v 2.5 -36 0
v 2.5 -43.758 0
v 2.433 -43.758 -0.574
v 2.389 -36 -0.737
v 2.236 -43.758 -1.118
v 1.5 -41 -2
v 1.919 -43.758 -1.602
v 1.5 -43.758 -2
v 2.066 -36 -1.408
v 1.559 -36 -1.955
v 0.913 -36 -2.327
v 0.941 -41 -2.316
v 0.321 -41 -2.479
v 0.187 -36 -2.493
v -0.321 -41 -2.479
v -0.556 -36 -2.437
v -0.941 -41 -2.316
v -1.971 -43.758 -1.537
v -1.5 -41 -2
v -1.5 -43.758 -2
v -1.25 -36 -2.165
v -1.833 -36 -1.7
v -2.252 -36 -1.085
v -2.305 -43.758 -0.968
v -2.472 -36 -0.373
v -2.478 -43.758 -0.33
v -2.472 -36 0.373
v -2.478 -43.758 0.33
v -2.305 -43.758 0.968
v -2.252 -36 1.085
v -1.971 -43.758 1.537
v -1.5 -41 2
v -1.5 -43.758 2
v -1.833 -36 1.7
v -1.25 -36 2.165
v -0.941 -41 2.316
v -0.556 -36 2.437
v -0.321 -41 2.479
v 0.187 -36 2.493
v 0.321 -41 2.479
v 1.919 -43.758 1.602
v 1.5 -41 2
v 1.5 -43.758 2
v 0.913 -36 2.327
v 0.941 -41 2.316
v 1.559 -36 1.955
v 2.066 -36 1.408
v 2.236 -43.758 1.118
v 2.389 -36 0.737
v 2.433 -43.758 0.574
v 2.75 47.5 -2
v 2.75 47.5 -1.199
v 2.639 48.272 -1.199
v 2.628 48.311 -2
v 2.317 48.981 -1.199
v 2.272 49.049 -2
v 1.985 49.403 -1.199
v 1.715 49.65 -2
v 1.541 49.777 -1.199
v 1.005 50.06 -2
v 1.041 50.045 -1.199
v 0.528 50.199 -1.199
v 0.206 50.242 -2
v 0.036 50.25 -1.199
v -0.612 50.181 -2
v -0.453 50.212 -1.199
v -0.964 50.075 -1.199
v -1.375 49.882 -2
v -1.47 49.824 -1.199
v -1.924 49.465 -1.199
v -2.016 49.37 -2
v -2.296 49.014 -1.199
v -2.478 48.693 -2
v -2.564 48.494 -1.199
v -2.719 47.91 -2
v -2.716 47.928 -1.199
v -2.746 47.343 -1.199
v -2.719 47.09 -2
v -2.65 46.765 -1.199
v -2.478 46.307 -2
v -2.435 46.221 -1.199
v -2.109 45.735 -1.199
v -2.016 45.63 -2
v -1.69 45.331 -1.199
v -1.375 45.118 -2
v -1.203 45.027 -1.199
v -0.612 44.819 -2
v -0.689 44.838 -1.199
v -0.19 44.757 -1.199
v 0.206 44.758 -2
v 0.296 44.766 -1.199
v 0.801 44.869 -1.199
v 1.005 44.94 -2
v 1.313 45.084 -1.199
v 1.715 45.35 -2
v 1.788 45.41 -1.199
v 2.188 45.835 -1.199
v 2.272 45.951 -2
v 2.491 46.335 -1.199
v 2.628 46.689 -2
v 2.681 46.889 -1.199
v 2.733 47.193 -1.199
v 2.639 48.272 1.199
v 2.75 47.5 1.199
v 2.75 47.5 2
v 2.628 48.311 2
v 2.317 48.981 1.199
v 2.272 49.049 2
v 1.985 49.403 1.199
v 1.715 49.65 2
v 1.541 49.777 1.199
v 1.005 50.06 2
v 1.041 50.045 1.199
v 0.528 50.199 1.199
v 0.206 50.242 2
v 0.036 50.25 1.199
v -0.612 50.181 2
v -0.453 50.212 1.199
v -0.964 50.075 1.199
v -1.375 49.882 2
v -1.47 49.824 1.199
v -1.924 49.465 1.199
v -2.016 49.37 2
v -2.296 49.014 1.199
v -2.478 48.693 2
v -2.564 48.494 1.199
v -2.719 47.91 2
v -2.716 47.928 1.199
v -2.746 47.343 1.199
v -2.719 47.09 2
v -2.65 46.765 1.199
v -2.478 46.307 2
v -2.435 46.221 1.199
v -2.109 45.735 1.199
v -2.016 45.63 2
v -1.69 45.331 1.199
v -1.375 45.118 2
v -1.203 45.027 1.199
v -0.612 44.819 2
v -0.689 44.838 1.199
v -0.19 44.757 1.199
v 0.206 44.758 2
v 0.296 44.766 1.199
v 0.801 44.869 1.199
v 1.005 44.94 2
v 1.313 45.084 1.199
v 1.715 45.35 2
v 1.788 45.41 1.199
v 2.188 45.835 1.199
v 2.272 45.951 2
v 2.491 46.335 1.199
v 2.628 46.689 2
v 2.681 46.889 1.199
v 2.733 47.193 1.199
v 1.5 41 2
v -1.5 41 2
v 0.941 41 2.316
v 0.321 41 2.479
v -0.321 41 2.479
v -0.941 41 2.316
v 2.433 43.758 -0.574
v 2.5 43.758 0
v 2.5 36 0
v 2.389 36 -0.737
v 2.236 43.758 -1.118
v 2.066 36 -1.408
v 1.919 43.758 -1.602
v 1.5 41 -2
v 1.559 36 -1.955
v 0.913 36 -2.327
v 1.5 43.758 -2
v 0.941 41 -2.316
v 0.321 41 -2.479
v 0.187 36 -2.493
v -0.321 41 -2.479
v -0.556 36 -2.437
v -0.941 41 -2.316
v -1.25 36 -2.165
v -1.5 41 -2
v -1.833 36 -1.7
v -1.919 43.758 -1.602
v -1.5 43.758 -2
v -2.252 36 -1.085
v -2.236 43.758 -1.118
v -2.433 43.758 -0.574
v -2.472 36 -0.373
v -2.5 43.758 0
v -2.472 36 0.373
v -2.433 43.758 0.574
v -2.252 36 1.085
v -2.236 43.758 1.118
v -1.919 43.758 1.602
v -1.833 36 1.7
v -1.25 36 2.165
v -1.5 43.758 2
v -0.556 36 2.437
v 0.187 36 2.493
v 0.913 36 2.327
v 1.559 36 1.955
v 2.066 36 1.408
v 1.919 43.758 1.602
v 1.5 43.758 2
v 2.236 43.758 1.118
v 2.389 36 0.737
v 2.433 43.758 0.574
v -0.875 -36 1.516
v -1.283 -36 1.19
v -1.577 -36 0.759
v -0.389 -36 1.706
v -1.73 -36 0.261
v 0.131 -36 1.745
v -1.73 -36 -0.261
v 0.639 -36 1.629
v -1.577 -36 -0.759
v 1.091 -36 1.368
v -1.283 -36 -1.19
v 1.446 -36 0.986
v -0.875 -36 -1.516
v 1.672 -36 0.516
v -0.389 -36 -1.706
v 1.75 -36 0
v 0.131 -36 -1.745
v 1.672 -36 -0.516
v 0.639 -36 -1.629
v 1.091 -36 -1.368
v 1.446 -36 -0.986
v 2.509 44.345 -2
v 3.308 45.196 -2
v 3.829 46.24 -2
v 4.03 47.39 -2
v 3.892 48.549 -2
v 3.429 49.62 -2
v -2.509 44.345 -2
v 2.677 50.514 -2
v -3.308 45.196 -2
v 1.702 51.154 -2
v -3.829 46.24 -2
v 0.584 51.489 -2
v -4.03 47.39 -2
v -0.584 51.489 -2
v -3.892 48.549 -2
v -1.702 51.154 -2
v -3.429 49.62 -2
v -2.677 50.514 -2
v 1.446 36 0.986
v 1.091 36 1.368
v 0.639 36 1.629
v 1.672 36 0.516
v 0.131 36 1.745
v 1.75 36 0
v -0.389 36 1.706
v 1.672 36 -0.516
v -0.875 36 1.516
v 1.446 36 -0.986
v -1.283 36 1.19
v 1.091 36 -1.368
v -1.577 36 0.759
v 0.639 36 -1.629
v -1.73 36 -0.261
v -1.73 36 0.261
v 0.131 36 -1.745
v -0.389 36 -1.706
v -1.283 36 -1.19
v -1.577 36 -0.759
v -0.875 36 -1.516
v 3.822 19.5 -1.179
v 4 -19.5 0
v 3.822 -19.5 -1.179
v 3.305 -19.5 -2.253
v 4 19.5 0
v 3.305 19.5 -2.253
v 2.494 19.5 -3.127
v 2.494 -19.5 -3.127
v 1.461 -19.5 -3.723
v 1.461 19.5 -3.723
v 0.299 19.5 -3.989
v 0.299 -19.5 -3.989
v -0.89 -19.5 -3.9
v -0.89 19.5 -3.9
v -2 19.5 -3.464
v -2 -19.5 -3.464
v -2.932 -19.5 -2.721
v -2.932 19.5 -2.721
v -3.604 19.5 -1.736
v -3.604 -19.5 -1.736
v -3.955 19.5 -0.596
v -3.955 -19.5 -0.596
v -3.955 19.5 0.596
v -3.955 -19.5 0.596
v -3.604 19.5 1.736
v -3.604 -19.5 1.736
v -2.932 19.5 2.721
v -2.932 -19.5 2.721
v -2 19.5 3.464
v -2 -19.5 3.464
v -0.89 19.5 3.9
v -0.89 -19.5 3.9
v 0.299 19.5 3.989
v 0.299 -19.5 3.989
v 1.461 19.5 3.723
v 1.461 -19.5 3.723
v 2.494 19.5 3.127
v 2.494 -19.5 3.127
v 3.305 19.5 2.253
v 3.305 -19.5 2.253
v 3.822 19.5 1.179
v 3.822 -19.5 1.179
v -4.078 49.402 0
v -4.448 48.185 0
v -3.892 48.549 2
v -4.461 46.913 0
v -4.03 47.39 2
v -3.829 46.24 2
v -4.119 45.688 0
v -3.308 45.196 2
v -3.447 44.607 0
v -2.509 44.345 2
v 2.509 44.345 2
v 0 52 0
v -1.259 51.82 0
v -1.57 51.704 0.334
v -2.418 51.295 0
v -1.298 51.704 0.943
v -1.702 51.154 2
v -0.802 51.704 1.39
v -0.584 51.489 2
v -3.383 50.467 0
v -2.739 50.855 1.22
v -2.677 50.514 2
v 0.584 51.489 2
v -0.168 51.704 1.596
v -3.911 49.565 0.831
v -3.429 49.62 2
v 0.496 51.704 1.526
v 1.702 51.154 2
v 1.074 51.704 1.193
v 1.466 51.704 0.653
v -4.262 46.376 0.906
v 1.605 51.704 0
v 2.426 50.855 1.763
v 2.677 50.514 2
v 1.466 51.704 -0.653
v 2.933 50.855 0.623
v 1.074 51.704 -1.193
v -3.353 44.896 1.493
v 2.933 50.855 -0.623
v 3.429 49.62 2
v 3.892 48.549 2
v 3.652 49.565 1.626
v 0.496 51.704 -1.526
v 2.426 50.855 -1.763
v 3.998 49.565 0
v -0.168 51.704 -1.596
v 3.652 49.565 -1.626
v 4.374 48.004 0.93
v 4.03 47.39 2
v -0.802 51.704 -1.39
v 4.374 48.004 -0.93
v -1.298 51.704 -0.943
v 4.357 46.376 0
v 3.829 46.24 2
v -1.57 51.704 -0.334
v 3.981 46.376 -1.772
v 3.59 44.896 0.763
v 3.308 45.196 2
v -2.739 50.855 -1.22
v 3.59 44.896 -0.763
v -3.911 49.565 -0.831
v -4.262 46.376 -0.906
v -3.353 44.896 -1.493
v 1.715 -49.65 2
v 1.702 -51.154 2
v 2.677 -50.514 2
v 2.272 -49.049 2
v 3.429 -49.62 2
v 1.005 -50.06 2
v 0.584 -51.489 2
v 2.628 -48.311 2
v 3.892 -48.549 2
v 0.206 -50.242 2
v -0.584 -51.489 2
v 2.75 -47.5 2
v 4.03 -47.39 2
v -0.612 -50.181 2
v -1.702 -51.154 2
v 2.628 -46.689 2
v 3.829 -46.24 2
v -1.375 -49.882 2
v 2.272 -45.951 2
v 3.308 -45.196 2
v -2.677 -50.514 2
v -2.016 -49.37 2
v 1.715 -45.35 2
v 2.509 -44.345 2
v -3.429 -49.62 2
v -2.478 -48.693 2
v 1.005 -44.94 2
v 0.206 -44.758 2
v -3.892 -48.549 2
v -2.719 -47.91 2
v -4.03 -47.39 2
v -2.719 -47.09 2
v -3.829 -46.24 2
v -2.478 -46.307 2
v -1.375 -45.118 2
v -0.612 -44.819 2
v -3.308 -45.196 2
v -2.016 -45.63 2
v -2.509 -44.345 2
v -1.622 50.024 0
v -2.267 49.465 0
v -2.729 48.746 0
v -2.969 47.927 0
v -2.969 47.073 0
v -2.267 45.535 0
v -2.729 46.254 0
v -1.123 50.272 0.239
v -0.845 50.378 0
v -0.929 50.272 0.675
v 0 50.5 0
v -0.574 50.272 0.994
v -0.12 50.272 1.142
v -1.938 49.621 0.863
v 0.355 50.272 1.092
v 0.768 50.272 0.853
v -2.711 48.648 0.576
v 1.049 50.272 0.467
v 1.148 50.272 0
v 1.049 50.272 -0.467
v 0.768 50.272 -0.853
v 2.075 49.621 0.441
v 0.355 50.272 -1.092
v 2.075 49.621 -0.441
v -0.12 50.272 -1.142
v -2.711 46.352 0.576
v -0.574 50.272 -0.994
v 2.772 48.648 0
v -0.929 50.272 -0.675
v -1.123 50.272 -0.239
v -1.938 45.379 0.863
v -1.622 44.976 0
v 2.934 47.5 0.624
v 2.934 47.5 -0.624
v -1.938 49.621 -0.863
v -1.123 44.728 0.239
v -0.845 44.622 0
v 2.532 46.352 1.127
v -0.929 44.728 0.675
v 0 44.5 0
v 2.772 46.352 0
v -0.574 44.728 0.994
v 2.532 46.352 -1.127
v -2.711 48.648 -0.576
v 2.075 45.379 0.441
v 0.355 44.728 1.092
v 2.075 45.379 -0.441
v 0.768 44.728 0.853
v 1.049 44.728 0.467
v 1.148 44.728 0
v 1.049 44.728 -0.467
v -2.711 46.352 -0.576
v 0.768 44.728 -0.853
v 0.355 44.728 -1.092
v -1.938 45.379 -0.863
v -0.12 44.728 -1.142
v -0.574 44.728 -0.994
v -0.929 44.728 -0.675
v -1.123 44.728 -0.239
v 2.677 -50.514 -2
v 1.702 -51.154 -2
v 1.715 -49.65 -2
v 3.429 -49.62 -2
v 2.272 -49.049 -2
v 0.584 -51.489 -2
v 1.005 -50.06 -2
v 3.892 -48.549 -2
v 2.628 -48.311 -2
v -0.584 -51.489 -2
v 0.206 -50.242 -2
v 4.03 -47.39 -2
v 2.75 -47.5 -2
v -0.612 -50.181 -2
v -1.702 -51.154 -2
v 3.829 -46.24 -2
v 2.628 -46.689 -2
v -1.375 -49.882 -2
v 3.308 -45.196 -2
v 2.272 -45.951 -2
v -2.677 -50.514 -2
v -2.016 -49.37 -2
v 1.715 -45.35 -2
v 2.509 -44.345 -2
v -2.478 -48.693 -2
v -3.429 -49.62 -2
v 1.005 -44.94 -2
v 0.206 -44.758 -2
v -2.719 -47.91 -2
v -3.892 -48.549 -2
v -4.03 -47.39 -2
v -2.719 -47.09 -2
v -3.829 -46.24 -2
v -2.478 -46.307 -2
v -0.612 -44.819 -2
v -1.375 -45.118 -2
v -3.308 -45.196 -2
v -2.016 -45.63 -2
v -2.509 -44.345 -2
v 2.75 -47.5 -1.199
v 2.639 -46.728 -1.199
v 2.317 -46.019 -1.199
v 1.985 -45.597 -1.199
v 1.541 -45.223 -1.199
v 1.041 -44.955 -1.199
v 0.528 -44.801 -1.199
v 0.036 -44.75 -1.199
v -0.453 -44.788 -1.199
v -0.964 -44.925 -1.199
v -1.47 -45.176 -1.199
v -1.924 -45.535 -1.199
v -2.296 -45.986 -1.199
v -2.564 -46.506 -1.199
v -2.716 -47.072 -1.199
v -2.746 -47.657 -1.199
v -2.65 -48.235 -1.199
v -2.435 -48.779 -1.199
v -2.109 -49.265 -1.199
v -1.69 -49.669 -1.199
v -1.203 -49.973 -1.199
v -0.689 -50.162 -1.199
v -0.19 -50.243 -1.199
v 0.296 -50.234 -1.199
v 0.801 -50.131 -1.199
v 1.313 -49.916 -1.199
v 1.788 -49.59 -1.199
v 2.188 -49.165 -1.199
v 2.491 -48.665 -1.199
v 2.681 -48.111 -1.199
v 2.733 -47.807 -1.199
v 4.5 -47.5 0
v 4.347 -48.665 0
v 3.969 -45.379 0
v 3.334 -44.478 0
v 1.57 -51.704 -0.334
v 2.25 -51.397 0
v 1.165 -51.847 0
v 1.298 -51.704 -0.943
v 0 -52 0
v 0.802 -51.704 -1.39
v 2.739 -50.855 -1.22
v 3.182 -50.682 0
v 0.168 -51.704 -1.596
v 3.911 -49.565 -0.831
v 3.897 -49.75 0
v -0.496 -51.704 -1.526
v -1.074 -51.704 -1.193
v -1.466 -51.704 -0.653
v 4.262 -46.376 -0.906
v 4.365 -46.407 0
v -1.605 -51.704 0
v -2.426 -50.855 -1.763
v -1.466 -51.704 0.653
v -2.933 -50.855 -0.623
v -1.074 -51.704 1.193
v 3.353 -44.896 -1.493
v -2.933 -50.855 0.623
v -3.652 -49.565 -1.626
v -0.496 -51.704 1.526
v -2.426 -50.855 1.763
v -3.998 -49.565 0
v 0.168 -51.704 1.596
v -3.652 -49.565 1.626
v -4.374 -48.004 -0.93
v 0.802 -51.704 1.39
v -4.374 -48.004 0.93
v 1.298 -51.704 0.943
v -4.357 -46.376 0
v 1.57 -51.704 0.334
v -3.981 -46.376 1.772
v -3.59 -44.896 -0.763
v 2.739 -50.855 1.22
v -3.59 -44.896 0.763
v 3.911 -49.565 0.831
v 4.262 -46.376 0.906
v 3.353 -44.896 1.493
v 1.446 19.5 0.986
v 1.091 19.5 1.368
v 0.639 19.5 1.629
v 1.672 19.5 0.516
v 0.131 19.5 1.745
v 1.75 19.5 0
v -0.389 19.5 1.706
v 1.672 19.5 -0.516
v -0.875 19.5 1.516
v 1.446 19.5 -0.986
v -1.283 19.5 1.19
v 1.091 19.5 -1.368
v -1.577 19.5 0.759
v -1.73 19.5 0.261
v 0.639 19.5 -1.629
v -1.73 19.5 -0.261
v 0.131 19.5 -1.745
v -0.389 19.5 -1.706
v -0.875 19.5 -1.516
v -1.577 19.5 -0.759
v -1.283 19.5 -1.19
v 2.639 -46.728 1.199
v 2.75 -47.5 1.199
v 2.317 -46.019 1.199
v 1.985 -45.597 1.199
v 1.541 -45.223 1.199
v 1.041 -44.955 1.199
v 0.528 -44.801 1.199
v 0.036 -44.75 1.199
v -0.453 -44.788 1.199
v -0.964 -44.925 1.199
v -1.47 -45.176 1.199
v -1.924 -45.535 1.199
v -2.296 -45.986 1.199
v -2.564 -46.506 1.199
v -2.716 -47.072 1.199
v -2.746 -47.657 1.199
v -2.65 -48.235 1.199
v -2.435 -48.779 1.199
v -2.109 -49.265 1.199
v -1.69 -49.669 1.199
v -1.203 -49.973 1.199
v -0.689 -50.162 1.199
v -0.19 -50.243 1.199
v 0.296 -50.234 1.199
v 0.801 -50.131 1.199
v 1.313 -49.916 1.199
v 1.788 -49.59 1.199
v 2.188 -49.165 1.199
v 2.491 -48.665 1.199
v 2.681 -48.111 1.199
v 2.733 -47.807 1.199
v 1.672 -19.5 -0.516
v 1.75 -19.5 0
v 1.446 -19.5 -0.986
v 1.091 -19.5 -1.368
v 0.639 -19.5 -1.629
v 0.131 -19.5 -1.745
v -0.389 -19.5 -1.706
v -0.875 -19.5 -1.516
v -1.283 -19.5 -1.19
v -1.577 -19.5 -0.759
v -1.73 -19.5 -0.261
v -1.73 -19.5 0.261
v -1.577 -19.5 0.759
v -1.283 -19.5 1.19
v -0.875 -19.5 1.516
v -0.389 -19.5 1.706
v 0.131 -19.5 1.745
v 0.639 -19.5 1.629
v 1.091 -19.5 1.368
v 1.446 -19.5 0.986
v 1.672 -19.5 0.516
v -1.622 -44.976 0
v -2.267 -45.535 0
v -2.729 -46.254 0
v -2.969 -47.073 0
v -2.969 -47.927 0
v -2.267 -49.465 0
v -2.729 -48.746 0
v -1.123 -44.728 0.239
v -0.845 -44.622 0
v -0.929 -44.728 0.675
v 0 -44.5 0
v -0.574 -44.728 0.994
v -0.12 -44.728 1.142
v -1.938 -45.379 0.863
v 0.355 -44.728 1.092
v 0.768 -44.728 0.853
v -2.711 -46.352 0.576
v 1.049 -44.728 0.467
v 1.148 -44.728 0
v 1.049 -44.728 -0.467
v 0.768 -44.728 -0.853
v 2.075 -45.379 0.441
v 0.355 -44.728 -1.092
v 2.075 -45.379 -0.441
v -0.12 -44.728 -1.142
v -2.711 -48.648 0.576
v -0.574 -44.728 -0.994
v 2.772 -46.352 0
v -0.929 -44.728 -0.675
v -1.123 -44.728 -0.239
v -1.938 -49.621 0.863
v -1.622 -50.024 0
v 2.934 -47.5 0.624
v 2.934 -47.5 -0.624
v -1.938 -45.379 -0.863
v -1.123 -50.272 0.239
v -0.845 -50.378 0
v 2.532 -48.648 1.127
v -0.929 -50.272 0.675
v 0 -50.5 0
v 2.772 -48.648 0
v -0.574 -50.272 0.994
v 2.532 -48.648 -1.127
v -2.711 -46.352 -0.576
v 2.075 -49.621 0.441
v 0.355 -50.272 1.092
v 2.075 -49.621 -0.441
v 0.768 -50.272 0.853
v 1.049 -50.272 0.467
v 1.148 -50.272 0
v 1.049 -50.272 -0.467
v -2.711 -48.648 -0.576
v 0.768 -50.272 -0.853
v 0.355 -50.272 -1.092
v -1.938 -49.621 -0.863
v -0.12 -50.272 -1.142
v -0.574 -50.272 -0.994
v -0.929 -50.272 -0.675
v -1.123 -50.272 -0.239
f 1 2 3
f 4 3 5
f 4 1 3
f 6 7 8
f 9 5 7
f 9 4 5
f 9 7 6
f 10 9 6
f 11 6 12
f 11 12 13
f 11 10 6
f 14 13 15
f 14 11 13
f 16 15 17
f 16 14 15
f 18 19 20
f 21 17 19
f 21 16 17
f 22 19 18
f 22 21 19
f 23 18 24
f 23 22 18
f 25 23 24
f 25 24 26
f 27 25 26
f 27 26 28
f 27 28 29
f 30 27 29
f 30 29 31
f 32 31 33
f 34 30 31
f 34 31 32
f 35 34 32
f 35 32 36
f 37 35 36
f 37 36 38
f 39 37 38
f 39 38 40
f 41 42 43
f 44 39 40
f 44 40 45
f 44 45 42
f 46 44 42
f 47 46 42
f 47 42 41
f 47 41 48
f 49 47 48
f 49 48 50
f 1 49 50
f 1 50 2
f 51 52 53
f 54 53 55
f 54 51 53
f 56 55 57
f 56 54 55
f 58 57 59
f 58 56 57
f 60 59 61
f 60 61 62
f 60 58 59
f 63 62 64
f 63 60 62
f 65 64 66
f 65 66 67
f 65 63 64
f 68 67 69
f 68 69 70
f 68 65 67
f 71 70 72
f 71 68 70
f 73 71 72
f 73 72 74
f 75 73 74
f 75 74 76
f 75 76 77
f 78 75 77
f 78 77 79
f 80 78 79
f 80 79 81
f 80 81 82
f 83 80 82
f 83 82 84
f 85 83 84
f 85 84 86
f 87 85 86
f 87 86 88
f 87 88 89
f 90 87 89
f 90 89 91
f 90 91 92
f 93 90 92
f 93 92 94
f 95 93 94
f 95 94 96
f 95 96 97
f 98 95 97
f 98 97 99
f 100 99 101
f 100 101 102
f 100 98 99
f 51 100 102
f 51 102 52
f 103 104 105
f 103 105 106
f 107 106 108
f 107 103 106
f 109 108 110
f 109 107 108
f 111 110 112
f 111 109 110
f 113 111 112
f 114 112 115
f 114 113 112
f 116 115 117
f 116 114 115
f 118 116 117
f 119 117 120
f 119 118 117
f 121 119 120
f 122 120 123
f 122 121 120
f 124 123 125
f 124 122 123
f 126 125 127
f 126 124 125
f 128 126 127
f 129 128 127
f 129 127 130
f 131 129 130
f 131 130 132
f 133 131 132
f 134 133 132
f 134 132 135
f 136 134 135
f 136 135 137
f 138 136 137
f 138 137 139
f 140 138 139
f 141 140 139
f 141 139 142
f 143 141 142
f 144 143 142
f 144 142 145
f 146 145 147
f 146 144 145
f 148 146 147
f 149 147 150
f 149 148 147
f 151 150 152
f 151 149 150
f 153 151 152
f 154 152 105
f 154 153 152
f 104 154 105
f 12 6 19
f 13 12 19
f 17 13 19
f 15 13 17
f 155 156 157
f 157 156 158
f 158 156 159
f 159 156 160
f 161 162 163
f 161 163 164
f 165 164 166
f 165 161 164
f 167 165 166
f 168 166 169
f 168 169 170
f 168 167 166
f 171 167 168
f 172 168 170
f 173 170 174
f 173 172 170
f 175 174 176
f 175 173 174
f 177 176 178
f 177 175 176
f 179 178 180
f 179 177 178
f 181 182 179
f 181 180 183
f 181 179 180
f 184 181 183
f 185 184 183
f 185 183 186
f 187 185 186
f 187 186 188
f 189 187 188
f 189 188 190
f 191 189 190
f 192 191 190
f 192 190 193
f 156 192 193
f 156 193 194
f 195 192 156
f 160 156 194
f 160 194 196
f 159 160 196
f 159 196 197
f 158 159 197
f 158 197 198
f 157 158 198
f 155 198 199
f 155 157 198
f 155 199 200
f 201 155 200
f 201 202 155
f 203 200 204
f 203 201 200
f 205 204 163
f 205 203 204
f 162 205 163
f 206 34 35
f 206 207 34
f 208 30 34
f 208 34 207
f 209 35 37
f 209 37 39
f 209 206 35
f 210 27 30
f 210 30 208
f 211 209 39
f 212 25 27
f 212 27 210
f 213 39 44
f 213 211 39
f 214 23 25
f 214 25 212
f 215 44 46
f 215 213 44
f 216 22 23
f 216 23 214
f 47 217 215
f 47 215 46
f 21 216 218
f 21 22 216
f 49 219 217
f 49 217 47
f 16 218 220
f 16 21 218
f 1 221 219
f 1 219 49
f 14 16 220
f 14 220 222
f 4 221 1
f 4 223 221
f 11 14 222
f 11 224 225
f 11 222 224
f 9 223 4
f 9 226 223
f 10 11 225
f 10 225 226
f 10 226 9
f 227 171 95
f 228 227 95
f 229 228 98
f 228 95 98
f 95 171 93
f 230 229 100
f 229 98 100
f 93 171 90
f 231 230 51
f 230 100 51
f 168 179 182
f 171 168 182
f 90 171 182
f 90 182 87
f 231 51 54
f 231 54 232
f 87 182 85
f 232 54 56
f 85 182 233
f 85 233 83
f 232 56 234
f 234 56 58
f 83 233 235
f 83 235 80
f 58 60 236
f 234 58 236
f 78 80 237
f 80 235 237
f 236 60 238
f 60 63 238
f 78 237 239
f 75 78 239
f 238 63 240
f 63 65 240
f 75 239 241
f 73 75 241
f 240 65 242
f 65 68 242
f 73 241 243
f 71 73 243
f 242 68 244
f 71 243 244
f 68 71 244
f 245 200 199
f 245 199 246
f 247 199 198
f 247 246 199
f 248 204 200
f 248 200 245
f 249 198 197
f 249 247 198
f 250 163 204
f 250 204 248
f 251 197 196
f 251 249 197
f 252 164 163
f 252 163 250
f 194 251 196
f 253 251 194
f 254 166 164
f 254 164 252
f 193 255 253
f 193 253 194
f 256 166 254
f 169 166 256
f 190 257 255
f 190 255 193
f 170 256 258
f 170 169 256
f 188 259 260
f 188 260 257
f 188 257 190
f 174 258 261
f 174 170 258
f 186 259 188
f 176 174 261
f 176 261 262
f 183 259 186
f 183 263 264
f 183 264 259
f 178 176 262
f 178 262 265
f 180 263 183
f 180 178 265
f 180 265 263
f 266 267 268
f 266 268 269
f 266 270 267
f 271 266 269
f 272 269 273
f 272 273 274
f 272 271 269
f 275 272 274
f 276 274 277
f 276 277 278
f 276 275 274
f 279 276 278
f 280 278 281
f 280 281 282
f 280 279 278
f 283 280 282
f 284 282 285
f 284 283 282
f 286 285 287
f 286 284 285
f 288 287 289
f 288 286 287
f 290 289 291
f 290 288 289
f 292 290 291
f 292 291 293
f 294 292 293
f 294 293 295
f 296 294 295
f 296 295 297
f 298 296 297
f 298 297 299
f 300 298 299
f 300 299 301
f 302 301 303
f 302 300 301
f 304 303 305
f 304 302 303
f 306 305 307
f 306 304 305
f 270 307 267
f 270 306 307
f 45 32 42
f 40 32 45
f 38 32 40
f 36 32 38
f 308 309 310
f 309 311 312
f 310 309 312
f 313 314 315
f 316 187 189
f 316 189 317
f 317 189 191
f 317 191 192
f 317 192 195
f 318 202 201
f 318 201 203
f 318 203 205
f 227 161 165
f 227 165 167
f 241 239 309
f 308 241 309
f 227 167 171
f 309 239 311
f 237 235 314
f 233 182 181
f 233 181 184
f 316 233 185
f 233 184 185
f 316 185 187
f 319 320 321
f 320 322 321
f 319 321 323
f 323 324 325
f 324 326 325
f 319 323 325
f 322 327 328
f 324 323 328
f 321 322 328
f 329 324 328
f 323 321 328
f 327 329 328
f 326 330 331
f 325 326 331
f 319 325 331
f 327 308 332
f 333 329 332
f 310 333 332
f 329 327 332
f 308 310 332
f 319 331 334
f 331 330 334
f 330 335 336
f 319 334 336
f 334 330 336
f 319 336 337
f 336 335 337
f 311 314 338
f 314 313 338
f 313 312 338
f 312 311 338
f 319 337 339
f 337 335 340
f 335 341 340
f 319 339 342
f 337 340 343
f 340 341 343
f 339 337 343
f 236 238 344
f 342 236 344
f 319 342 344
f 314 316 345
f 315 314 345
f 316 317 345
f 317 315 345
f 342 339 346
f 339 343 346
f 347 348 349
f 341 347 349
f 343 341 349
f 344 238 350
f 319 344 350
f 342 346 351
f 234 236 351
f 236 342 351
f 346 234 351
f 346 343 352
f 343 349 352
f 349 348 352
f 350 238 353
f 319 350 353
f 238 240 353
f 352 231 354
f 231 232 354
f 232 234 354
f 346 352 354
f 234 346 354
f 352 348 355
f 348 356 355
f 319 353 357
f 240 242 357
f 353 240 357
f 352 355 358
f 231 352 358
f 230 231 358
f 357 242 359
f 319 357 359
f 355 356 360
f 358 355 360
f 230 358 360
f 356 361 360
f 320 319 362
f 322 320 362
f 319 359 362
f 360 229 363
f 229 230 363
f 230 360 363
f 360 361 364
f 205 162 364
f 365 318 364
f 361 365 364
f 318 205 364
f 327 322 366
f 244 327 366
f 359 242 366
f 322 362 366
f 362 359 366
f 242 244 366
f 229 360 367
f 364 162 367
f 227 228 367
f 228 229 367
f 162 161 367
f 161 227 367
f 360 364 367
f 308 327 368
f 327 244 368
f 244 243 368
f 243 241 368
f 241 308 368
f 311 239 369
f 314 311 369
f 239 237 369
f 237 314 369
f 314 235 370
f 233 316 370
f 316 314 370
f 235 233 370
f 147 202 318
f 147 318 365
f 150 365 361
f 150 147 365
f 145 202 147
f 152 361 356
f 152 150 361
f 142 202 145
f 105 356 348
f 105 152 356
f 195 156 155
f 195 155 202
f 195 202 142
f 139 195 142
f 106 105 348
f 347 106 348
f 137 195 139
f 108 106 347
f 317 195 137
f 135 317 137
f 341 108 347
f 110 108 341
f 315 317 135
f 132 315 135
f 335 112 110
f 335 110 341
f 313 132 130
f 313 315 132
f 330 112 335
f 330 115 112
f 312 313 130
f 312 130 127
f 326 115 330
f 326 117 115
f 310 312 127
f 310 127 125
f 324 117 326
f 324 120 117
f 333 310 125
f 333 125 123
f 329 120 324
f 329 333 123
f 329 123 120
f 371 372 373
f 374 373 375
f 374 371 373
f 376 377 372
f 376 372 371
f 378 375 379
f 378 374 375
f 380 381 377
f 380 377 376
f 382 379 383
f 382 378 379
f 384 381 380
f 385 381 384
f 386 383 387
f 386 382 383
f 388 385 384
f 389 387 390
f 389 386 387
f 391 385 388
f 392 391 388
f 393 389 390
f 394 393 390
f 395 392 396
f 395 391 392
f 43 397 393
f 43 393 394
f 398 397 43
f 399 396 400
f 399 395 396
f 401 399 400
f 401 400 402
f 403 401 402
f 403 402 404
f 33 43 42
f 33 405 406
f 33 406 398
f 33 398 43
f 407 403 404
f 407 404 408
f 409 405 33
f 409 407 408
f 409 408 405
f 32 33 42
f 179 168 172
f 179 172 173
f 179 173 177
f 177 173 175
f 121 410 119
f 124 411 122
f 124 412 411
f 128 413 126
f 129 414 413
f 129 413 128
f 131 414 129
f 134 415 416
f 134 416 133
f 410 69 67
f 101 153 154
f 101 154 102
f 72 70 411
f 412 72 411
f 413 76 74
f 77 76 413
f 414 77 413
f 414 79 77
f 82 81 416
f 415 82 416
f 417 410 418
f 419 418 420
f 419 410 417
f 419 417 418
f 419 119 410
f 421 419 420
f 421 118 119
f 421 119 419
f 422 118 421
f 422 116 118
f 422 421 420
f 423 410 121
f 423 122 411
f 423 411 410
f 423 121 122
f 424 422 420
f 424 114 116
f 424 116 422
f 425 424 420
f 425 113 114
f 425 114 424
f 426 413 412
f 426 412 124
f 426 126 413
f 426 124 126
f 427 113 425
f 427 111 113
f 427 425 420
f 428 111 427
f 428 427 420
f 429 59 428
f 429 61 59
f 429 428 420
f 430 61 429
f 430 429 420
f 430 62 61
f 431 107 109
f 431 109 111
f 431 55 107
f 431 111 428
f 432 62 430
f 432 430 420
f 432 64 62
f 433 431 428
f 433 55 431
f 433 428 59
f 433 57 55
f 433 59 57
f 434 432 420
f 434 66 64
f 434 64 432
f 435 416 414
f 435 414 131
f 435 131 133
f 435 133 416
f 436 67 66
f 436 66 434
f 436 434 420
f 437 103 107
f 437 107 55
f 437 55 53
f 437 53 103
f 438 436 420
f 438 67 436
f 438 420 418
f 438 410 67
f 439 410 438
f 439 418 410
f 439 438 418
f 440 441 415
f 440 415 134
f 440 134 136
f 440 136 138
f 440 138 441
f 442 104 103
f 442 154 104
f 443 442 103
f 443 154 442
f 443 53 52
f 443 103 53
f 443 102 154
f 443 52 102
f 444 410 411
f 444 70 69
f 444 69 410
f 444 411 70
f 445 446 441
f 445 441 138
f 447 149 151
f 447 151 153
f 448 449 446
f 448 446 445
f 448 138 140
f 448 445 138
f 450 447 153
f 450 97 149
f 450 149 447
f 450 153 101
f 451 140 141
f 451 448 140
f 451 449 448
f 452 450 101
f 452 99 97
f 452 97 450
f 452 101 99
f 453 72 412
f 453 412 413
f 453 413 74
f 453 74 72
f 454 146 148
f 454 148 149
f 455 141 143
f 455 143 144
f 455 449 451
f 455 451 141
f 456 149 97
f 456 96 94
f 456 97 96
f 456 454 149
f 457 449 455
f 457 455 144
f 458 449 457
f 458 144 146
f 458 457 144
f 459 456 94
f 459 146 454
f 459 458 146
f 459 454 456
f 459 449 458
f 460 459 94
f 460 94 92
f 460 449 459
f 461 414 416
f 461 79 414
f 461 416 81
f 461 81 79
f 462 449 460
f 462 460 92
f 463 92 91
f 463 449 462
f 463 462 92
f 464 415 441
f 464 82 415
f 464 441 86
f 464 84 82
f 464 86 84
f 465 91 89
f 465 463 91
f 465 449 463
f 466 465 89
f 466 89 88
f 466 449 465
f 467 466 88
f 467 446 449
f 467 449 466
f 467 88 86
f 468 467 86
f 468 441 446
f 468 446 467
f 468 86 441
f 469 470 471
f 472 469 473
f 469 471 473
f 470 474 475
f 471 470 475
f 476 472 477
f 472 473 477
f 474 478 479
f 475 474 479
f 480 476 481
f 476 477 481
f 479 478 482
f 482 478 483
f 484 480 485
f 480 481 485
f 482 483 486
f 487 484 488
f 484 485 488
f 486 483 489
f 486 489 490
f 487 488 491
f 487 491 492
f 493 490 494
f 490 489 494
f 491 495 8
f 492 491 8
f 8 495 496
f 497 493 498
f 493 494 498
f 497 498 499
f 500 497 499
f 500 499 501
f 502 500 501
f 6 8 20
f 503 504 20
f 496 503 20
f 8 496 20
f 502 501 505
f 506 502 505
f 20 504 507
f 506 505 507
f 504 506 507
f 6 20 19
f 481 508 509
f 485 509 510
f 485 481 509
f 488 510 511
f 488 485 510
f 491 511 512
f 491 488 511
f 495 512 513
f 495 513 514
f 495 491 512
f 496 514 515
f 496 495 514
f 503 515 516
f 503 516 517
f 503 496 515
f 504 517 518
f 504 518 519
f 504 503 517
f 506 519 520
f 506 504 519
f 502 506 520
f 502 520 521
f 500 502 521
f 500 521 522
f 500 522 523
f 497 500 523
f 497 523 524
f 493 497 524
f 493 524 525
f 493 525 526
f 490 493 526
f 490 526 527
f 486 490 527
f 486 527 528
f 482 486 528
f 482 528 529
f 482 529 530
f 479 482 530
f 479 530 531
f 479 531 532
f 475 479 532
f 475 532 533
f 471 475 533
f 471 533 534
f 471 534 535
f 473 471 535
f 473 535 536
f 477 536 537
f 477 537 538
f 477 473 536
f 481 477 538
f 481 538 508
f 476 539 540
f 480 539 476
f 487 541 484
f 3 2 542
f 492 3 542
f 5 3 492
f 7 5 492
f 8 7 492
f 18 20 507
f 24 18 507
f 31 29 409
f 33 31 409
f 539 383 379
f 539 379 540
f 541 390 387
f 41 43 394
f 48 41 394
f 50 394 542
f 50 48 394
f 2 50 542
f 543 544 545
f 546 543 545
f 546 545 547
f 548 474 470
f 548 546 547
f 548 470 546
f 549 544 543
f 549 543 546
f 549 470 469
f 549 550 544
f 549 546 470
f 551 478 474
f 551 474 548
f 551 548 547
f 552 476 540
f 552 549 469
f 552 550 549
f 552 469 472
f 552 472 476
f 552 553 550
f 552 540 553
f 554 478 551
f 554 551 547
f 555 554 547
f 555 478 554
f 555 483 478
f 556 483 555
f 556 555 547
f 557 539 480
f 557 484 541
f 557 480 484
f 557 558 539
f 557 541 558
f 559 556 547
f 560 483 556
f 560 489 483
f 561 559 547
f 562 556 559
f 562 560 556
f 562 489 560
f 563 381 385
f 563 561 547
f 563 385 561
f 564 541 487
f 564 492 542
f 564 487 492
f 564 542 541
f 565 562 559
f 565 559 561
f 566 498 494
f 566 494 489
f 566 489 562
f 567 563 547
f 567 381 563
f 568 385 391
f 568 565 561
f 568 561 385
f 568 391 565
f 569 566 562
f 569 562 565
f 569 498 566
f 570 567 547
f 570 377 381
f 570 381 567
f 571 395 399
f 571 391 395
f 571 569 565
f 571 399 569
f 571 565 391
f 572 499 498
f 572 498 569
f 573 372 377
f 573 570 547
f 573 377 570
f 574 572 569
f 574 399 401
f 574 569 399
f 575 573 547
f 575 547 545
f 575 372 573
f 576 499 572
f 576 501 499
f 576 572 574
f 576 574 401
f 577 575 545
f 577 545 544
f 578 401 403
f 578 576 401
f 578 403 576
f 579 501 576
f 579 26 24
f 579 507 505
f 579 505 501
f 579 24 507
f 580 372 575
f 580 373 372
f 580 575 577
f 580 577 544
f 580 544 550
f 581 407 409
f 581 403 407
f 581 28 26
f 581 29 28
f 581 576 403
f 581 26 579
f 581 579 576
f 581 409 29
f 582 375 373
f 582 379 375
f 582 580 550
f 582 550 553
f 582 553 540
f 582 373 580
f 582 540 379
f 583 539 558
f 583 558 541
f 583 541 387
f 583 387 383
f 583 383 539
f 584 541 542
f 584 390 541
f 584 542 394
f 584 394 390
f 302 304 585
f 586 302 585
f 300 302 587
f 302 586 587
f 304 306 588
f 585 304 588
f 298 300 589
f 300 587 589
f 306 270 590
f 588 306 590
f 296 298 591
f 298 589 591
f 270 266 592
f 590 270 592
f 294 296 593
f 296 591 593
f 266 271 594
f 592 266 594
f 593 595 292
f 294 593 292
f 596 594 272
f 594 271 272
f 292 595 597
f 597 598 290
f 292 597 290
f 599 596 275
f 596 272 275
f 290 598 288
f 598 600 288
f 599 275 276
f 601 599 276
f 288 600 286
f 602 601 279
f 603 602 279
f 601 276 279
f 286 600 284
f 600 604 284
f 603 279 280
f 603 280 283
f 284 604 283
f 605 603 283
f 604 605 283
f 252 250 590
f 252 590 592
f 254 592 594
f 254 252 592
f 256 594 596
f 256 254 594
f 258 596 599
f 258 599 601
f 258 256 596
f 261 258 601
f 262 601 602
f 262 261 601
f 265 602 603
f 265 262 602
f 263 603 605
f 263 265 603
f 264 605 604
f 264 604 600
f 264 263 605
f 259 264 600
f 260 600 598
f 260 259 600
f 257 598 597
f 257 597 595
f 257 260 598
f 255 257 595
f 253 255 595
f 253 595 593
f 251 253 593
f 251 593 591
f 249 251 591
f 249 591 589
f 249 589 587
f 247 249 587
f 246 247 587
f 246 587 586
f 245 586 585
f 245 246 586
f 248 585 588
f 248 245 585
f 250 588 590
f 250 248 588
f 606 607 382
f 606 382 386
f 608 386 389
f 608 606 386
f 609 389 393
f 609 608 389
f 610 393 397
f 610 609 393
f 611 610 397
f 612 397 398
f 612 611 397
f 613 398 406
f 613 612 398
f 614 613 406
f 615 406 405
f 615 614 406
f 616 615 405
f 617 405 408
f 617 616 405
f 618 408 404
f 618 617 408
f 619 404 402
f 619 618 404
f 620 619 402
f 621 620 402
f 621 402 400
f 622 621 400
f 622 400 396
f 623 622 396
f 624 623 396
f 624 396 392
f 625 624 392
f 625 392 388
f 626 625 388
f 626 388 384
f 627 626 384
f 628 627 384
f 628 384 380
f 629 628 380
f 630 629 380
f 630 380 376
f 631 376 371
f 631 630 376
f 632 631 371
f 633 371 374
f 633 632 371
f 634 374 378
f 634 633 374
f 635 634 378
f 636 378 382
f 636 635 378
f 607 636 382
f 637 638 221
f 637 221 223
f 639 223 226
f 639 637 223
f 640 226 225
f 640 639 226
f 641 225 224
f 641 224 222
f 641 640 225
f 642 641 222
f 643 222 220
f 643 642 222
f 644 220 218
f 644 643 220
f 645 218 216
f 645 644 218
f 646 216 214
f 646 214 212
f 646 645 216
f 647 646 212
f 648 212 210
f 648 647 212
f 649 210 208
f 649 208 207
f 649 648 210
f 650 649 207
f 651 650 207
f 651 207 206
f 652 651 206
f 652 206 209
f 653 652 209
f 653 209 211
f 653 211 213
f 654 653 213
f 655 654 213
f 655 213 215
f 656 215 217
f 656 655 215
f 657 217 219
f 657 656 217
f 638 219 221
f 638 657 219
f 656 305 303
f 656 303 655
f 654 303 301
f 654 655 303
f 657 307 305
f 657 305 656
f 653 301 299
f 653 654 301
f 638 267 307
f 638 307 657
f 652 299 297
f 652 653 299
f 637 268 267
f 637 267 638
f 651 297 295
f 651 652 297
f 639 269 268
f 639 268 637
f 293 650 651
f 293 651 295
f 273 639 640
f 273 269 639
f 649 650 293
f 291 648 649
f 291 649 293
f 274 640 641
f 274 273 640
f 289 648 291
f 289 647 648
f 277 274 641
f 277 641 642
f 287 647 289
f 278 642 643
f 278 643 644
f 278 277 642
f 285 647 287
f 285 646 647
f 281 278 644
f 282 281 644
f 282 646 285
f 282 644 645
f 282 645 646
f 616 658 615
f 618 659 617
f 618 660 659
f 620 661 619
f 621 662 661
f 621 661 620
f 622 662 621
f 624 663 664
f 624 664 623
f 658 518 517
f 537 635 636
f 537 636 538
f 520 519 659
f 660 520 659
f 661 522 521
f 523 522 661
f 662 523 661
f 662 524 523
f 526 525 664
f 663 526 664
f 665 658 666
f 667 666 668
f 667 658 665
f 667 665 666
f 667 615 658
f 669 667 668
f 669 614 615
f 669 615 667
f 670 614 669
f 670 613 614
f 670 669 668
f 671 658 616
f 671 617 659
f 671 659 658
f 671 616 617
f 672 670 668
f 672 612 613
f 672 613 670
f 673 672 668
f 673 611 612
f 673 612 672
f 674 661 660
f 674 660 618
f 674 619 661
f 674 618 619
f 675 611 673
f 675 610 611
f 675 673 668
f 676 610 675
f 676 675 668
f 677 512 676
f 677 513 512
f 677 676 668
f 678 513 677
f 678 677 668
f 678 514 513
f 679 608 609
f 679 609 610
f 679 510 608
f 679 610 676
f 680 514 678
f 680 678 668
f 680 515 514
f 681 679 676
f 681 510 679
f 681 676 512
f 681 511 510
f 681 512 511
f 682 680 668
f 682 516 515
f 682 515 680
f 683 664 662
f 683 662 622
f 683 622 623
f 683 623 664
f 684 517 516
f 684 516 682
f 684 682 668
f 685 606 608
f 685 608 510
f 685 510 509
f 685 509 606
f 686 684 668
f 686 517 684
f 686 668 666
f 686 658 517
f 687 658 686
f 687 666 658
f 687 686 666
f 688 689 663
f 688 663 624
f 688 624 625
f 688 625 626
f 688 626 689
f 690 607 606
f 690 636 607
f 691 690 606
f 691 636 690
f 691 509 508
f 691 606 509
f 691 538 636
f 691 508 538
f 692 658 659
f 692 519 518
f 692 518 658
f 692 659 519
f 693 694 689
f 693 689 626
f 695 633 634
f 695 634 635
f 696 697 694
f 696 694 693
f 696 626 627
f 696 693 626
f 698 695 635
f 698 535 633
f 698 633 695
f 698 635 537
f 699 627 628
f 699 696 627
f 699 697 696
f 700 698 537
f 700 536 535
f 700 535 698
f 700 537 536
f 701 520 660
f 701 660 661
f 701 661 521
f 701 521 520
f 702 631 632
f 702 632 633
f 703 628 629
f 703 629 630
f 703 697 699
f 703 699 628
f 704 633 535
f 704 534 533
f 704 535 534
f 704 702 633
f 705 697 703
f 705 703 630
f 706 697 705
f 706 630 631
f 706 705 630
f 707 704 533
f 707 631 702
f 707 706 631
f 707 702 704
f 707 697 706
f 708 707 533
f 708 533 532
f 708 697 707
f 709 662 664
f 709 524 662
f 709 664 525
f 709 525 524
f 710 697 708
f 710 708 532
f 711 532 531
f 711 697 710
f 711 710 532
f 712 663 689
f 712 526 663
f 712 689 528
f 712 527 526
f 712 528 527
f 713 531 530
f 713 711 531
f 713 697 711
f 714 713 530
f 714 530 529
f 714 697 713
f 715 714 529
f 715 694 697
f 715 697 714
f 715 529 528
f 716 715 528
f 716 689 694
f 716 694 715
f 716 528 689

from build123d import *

# Parameters (mm, degrees)
CUT_EXTRUDE_1_DEPTH      = 53.38797572
CUT_EXTRUDE_1_DEPTH_BACK = 53.38797572
SKETCH_3_W               = 3
SKETCH_3_H               = 15
CUT_EXTRUDE_2_DEPTH      = 53.538081427
CUT_EXTRUDE_2_DEPTH_BACK = 53.538081427
SKETCH_4_R               = 2.75


with BuildPart() as part:
    # 草圖1 → 旋轉1 (revolve)
    with BuildSketch(Plane.XY):
        with BuildLine():
            ThreePointArc((2.5, 43.758342613), (4.30624304, 48.80624304), (0, 52))
            Line((0, 52), (0, -52))
            ThreePointArc((0, -52), (4.30624304, -48.80624304), (2.5, -43.758342613))
            Line((2.5, -43.758342613), (2.5, -36))
            Line((2.5, -36), (1.75, -36))
            Line((1.75, -36), (1.75, -19.5))
            Line((1.75, -19.5), (4, -19.5))
            Line((4, -19.5), (4, 19.5))
            Line((4, 19.5), (1.75, 19.5))
            Line((1.75, 19.5), (1.75, 36))
            Line((1.75, 36), (2.5, 36))
            Line((2.5, 36), (2.5, 43.758342613))
        make_face()
    revolve(axis=Axis((0, -1000, 0), (0, 1, 0)))

    # 草圖2 → 除料-旋轉1 (revolve, cut)
    with BuildSketch(Plane.XY):
        with BuildLine():
            Line((0, 50.5), (0, 44.5))
            ThreePointArc((0, 44.5), (3, 47.5), (0, 50.5))
        make_face()
        with BuildLine():
            Line((0, -44.5), (0, -50.5))
            ThreePointArc((0, -50.5), (3, -47.5), (0, -44.5))
        make_face()
    revolve(axis=Axis((0, -1000, 0), (0, 1, 0)), mode=Mode.SUBTRACT)

    # 草圖3 → 除料-伸長1 (cut, two sides: drawn at the far end of the back side and taken through both)
    with BuildSketch(Plane(origin=(0, 0, 0), x_dir=(0, 0, -1), z_dir=(1, 0, 0)).offset(-CUT_EXTRUDE_1_DEPTH_BACK)):
        with Locations((-3.5, 48.5)):
            Rectangle(SKETCH_3_W, SKETCH_3_H)
        with Locations((3.5, 48.5)):
            Rectangle(SKETCH_3_W, SKETCH_3_H)
        with Locations((3.5, -48.5)):
            Rectangle(SKETCH_3_W, SKETCH_3_H)
        with Locations((-3.5, -48.5)):
            Rectangle(SKETCH_3_W, SKETCH_3_H)
    extrude(amount=CUT_EXTRUDE_1_DEPTH + CUT_EXTRUDE_1_DEPTH_BACK, mode=Mode.SUBTRACT)

    # 草圖4 → 除料-伸長2 (cut, two sides: drawn at the far end of the back side and taken through both)
    with BuildSketch(Plane.XY.offset(2).offset(-CUT_EXTRUDE_2_DEPTH_BACK)):
        with Locations((0, 47.5)):
            Circle(SKETCH_4_R)
        with Locations((0, -47.5)):
            Circle(SKETCH_4_R)
    extrude(amount=CUT_EXTRUDE_2_DEPTH + CUT_EXTRUDE_2_DEPTH_BACK, mode=Mode.SUBTRACT)


solid = part.part
